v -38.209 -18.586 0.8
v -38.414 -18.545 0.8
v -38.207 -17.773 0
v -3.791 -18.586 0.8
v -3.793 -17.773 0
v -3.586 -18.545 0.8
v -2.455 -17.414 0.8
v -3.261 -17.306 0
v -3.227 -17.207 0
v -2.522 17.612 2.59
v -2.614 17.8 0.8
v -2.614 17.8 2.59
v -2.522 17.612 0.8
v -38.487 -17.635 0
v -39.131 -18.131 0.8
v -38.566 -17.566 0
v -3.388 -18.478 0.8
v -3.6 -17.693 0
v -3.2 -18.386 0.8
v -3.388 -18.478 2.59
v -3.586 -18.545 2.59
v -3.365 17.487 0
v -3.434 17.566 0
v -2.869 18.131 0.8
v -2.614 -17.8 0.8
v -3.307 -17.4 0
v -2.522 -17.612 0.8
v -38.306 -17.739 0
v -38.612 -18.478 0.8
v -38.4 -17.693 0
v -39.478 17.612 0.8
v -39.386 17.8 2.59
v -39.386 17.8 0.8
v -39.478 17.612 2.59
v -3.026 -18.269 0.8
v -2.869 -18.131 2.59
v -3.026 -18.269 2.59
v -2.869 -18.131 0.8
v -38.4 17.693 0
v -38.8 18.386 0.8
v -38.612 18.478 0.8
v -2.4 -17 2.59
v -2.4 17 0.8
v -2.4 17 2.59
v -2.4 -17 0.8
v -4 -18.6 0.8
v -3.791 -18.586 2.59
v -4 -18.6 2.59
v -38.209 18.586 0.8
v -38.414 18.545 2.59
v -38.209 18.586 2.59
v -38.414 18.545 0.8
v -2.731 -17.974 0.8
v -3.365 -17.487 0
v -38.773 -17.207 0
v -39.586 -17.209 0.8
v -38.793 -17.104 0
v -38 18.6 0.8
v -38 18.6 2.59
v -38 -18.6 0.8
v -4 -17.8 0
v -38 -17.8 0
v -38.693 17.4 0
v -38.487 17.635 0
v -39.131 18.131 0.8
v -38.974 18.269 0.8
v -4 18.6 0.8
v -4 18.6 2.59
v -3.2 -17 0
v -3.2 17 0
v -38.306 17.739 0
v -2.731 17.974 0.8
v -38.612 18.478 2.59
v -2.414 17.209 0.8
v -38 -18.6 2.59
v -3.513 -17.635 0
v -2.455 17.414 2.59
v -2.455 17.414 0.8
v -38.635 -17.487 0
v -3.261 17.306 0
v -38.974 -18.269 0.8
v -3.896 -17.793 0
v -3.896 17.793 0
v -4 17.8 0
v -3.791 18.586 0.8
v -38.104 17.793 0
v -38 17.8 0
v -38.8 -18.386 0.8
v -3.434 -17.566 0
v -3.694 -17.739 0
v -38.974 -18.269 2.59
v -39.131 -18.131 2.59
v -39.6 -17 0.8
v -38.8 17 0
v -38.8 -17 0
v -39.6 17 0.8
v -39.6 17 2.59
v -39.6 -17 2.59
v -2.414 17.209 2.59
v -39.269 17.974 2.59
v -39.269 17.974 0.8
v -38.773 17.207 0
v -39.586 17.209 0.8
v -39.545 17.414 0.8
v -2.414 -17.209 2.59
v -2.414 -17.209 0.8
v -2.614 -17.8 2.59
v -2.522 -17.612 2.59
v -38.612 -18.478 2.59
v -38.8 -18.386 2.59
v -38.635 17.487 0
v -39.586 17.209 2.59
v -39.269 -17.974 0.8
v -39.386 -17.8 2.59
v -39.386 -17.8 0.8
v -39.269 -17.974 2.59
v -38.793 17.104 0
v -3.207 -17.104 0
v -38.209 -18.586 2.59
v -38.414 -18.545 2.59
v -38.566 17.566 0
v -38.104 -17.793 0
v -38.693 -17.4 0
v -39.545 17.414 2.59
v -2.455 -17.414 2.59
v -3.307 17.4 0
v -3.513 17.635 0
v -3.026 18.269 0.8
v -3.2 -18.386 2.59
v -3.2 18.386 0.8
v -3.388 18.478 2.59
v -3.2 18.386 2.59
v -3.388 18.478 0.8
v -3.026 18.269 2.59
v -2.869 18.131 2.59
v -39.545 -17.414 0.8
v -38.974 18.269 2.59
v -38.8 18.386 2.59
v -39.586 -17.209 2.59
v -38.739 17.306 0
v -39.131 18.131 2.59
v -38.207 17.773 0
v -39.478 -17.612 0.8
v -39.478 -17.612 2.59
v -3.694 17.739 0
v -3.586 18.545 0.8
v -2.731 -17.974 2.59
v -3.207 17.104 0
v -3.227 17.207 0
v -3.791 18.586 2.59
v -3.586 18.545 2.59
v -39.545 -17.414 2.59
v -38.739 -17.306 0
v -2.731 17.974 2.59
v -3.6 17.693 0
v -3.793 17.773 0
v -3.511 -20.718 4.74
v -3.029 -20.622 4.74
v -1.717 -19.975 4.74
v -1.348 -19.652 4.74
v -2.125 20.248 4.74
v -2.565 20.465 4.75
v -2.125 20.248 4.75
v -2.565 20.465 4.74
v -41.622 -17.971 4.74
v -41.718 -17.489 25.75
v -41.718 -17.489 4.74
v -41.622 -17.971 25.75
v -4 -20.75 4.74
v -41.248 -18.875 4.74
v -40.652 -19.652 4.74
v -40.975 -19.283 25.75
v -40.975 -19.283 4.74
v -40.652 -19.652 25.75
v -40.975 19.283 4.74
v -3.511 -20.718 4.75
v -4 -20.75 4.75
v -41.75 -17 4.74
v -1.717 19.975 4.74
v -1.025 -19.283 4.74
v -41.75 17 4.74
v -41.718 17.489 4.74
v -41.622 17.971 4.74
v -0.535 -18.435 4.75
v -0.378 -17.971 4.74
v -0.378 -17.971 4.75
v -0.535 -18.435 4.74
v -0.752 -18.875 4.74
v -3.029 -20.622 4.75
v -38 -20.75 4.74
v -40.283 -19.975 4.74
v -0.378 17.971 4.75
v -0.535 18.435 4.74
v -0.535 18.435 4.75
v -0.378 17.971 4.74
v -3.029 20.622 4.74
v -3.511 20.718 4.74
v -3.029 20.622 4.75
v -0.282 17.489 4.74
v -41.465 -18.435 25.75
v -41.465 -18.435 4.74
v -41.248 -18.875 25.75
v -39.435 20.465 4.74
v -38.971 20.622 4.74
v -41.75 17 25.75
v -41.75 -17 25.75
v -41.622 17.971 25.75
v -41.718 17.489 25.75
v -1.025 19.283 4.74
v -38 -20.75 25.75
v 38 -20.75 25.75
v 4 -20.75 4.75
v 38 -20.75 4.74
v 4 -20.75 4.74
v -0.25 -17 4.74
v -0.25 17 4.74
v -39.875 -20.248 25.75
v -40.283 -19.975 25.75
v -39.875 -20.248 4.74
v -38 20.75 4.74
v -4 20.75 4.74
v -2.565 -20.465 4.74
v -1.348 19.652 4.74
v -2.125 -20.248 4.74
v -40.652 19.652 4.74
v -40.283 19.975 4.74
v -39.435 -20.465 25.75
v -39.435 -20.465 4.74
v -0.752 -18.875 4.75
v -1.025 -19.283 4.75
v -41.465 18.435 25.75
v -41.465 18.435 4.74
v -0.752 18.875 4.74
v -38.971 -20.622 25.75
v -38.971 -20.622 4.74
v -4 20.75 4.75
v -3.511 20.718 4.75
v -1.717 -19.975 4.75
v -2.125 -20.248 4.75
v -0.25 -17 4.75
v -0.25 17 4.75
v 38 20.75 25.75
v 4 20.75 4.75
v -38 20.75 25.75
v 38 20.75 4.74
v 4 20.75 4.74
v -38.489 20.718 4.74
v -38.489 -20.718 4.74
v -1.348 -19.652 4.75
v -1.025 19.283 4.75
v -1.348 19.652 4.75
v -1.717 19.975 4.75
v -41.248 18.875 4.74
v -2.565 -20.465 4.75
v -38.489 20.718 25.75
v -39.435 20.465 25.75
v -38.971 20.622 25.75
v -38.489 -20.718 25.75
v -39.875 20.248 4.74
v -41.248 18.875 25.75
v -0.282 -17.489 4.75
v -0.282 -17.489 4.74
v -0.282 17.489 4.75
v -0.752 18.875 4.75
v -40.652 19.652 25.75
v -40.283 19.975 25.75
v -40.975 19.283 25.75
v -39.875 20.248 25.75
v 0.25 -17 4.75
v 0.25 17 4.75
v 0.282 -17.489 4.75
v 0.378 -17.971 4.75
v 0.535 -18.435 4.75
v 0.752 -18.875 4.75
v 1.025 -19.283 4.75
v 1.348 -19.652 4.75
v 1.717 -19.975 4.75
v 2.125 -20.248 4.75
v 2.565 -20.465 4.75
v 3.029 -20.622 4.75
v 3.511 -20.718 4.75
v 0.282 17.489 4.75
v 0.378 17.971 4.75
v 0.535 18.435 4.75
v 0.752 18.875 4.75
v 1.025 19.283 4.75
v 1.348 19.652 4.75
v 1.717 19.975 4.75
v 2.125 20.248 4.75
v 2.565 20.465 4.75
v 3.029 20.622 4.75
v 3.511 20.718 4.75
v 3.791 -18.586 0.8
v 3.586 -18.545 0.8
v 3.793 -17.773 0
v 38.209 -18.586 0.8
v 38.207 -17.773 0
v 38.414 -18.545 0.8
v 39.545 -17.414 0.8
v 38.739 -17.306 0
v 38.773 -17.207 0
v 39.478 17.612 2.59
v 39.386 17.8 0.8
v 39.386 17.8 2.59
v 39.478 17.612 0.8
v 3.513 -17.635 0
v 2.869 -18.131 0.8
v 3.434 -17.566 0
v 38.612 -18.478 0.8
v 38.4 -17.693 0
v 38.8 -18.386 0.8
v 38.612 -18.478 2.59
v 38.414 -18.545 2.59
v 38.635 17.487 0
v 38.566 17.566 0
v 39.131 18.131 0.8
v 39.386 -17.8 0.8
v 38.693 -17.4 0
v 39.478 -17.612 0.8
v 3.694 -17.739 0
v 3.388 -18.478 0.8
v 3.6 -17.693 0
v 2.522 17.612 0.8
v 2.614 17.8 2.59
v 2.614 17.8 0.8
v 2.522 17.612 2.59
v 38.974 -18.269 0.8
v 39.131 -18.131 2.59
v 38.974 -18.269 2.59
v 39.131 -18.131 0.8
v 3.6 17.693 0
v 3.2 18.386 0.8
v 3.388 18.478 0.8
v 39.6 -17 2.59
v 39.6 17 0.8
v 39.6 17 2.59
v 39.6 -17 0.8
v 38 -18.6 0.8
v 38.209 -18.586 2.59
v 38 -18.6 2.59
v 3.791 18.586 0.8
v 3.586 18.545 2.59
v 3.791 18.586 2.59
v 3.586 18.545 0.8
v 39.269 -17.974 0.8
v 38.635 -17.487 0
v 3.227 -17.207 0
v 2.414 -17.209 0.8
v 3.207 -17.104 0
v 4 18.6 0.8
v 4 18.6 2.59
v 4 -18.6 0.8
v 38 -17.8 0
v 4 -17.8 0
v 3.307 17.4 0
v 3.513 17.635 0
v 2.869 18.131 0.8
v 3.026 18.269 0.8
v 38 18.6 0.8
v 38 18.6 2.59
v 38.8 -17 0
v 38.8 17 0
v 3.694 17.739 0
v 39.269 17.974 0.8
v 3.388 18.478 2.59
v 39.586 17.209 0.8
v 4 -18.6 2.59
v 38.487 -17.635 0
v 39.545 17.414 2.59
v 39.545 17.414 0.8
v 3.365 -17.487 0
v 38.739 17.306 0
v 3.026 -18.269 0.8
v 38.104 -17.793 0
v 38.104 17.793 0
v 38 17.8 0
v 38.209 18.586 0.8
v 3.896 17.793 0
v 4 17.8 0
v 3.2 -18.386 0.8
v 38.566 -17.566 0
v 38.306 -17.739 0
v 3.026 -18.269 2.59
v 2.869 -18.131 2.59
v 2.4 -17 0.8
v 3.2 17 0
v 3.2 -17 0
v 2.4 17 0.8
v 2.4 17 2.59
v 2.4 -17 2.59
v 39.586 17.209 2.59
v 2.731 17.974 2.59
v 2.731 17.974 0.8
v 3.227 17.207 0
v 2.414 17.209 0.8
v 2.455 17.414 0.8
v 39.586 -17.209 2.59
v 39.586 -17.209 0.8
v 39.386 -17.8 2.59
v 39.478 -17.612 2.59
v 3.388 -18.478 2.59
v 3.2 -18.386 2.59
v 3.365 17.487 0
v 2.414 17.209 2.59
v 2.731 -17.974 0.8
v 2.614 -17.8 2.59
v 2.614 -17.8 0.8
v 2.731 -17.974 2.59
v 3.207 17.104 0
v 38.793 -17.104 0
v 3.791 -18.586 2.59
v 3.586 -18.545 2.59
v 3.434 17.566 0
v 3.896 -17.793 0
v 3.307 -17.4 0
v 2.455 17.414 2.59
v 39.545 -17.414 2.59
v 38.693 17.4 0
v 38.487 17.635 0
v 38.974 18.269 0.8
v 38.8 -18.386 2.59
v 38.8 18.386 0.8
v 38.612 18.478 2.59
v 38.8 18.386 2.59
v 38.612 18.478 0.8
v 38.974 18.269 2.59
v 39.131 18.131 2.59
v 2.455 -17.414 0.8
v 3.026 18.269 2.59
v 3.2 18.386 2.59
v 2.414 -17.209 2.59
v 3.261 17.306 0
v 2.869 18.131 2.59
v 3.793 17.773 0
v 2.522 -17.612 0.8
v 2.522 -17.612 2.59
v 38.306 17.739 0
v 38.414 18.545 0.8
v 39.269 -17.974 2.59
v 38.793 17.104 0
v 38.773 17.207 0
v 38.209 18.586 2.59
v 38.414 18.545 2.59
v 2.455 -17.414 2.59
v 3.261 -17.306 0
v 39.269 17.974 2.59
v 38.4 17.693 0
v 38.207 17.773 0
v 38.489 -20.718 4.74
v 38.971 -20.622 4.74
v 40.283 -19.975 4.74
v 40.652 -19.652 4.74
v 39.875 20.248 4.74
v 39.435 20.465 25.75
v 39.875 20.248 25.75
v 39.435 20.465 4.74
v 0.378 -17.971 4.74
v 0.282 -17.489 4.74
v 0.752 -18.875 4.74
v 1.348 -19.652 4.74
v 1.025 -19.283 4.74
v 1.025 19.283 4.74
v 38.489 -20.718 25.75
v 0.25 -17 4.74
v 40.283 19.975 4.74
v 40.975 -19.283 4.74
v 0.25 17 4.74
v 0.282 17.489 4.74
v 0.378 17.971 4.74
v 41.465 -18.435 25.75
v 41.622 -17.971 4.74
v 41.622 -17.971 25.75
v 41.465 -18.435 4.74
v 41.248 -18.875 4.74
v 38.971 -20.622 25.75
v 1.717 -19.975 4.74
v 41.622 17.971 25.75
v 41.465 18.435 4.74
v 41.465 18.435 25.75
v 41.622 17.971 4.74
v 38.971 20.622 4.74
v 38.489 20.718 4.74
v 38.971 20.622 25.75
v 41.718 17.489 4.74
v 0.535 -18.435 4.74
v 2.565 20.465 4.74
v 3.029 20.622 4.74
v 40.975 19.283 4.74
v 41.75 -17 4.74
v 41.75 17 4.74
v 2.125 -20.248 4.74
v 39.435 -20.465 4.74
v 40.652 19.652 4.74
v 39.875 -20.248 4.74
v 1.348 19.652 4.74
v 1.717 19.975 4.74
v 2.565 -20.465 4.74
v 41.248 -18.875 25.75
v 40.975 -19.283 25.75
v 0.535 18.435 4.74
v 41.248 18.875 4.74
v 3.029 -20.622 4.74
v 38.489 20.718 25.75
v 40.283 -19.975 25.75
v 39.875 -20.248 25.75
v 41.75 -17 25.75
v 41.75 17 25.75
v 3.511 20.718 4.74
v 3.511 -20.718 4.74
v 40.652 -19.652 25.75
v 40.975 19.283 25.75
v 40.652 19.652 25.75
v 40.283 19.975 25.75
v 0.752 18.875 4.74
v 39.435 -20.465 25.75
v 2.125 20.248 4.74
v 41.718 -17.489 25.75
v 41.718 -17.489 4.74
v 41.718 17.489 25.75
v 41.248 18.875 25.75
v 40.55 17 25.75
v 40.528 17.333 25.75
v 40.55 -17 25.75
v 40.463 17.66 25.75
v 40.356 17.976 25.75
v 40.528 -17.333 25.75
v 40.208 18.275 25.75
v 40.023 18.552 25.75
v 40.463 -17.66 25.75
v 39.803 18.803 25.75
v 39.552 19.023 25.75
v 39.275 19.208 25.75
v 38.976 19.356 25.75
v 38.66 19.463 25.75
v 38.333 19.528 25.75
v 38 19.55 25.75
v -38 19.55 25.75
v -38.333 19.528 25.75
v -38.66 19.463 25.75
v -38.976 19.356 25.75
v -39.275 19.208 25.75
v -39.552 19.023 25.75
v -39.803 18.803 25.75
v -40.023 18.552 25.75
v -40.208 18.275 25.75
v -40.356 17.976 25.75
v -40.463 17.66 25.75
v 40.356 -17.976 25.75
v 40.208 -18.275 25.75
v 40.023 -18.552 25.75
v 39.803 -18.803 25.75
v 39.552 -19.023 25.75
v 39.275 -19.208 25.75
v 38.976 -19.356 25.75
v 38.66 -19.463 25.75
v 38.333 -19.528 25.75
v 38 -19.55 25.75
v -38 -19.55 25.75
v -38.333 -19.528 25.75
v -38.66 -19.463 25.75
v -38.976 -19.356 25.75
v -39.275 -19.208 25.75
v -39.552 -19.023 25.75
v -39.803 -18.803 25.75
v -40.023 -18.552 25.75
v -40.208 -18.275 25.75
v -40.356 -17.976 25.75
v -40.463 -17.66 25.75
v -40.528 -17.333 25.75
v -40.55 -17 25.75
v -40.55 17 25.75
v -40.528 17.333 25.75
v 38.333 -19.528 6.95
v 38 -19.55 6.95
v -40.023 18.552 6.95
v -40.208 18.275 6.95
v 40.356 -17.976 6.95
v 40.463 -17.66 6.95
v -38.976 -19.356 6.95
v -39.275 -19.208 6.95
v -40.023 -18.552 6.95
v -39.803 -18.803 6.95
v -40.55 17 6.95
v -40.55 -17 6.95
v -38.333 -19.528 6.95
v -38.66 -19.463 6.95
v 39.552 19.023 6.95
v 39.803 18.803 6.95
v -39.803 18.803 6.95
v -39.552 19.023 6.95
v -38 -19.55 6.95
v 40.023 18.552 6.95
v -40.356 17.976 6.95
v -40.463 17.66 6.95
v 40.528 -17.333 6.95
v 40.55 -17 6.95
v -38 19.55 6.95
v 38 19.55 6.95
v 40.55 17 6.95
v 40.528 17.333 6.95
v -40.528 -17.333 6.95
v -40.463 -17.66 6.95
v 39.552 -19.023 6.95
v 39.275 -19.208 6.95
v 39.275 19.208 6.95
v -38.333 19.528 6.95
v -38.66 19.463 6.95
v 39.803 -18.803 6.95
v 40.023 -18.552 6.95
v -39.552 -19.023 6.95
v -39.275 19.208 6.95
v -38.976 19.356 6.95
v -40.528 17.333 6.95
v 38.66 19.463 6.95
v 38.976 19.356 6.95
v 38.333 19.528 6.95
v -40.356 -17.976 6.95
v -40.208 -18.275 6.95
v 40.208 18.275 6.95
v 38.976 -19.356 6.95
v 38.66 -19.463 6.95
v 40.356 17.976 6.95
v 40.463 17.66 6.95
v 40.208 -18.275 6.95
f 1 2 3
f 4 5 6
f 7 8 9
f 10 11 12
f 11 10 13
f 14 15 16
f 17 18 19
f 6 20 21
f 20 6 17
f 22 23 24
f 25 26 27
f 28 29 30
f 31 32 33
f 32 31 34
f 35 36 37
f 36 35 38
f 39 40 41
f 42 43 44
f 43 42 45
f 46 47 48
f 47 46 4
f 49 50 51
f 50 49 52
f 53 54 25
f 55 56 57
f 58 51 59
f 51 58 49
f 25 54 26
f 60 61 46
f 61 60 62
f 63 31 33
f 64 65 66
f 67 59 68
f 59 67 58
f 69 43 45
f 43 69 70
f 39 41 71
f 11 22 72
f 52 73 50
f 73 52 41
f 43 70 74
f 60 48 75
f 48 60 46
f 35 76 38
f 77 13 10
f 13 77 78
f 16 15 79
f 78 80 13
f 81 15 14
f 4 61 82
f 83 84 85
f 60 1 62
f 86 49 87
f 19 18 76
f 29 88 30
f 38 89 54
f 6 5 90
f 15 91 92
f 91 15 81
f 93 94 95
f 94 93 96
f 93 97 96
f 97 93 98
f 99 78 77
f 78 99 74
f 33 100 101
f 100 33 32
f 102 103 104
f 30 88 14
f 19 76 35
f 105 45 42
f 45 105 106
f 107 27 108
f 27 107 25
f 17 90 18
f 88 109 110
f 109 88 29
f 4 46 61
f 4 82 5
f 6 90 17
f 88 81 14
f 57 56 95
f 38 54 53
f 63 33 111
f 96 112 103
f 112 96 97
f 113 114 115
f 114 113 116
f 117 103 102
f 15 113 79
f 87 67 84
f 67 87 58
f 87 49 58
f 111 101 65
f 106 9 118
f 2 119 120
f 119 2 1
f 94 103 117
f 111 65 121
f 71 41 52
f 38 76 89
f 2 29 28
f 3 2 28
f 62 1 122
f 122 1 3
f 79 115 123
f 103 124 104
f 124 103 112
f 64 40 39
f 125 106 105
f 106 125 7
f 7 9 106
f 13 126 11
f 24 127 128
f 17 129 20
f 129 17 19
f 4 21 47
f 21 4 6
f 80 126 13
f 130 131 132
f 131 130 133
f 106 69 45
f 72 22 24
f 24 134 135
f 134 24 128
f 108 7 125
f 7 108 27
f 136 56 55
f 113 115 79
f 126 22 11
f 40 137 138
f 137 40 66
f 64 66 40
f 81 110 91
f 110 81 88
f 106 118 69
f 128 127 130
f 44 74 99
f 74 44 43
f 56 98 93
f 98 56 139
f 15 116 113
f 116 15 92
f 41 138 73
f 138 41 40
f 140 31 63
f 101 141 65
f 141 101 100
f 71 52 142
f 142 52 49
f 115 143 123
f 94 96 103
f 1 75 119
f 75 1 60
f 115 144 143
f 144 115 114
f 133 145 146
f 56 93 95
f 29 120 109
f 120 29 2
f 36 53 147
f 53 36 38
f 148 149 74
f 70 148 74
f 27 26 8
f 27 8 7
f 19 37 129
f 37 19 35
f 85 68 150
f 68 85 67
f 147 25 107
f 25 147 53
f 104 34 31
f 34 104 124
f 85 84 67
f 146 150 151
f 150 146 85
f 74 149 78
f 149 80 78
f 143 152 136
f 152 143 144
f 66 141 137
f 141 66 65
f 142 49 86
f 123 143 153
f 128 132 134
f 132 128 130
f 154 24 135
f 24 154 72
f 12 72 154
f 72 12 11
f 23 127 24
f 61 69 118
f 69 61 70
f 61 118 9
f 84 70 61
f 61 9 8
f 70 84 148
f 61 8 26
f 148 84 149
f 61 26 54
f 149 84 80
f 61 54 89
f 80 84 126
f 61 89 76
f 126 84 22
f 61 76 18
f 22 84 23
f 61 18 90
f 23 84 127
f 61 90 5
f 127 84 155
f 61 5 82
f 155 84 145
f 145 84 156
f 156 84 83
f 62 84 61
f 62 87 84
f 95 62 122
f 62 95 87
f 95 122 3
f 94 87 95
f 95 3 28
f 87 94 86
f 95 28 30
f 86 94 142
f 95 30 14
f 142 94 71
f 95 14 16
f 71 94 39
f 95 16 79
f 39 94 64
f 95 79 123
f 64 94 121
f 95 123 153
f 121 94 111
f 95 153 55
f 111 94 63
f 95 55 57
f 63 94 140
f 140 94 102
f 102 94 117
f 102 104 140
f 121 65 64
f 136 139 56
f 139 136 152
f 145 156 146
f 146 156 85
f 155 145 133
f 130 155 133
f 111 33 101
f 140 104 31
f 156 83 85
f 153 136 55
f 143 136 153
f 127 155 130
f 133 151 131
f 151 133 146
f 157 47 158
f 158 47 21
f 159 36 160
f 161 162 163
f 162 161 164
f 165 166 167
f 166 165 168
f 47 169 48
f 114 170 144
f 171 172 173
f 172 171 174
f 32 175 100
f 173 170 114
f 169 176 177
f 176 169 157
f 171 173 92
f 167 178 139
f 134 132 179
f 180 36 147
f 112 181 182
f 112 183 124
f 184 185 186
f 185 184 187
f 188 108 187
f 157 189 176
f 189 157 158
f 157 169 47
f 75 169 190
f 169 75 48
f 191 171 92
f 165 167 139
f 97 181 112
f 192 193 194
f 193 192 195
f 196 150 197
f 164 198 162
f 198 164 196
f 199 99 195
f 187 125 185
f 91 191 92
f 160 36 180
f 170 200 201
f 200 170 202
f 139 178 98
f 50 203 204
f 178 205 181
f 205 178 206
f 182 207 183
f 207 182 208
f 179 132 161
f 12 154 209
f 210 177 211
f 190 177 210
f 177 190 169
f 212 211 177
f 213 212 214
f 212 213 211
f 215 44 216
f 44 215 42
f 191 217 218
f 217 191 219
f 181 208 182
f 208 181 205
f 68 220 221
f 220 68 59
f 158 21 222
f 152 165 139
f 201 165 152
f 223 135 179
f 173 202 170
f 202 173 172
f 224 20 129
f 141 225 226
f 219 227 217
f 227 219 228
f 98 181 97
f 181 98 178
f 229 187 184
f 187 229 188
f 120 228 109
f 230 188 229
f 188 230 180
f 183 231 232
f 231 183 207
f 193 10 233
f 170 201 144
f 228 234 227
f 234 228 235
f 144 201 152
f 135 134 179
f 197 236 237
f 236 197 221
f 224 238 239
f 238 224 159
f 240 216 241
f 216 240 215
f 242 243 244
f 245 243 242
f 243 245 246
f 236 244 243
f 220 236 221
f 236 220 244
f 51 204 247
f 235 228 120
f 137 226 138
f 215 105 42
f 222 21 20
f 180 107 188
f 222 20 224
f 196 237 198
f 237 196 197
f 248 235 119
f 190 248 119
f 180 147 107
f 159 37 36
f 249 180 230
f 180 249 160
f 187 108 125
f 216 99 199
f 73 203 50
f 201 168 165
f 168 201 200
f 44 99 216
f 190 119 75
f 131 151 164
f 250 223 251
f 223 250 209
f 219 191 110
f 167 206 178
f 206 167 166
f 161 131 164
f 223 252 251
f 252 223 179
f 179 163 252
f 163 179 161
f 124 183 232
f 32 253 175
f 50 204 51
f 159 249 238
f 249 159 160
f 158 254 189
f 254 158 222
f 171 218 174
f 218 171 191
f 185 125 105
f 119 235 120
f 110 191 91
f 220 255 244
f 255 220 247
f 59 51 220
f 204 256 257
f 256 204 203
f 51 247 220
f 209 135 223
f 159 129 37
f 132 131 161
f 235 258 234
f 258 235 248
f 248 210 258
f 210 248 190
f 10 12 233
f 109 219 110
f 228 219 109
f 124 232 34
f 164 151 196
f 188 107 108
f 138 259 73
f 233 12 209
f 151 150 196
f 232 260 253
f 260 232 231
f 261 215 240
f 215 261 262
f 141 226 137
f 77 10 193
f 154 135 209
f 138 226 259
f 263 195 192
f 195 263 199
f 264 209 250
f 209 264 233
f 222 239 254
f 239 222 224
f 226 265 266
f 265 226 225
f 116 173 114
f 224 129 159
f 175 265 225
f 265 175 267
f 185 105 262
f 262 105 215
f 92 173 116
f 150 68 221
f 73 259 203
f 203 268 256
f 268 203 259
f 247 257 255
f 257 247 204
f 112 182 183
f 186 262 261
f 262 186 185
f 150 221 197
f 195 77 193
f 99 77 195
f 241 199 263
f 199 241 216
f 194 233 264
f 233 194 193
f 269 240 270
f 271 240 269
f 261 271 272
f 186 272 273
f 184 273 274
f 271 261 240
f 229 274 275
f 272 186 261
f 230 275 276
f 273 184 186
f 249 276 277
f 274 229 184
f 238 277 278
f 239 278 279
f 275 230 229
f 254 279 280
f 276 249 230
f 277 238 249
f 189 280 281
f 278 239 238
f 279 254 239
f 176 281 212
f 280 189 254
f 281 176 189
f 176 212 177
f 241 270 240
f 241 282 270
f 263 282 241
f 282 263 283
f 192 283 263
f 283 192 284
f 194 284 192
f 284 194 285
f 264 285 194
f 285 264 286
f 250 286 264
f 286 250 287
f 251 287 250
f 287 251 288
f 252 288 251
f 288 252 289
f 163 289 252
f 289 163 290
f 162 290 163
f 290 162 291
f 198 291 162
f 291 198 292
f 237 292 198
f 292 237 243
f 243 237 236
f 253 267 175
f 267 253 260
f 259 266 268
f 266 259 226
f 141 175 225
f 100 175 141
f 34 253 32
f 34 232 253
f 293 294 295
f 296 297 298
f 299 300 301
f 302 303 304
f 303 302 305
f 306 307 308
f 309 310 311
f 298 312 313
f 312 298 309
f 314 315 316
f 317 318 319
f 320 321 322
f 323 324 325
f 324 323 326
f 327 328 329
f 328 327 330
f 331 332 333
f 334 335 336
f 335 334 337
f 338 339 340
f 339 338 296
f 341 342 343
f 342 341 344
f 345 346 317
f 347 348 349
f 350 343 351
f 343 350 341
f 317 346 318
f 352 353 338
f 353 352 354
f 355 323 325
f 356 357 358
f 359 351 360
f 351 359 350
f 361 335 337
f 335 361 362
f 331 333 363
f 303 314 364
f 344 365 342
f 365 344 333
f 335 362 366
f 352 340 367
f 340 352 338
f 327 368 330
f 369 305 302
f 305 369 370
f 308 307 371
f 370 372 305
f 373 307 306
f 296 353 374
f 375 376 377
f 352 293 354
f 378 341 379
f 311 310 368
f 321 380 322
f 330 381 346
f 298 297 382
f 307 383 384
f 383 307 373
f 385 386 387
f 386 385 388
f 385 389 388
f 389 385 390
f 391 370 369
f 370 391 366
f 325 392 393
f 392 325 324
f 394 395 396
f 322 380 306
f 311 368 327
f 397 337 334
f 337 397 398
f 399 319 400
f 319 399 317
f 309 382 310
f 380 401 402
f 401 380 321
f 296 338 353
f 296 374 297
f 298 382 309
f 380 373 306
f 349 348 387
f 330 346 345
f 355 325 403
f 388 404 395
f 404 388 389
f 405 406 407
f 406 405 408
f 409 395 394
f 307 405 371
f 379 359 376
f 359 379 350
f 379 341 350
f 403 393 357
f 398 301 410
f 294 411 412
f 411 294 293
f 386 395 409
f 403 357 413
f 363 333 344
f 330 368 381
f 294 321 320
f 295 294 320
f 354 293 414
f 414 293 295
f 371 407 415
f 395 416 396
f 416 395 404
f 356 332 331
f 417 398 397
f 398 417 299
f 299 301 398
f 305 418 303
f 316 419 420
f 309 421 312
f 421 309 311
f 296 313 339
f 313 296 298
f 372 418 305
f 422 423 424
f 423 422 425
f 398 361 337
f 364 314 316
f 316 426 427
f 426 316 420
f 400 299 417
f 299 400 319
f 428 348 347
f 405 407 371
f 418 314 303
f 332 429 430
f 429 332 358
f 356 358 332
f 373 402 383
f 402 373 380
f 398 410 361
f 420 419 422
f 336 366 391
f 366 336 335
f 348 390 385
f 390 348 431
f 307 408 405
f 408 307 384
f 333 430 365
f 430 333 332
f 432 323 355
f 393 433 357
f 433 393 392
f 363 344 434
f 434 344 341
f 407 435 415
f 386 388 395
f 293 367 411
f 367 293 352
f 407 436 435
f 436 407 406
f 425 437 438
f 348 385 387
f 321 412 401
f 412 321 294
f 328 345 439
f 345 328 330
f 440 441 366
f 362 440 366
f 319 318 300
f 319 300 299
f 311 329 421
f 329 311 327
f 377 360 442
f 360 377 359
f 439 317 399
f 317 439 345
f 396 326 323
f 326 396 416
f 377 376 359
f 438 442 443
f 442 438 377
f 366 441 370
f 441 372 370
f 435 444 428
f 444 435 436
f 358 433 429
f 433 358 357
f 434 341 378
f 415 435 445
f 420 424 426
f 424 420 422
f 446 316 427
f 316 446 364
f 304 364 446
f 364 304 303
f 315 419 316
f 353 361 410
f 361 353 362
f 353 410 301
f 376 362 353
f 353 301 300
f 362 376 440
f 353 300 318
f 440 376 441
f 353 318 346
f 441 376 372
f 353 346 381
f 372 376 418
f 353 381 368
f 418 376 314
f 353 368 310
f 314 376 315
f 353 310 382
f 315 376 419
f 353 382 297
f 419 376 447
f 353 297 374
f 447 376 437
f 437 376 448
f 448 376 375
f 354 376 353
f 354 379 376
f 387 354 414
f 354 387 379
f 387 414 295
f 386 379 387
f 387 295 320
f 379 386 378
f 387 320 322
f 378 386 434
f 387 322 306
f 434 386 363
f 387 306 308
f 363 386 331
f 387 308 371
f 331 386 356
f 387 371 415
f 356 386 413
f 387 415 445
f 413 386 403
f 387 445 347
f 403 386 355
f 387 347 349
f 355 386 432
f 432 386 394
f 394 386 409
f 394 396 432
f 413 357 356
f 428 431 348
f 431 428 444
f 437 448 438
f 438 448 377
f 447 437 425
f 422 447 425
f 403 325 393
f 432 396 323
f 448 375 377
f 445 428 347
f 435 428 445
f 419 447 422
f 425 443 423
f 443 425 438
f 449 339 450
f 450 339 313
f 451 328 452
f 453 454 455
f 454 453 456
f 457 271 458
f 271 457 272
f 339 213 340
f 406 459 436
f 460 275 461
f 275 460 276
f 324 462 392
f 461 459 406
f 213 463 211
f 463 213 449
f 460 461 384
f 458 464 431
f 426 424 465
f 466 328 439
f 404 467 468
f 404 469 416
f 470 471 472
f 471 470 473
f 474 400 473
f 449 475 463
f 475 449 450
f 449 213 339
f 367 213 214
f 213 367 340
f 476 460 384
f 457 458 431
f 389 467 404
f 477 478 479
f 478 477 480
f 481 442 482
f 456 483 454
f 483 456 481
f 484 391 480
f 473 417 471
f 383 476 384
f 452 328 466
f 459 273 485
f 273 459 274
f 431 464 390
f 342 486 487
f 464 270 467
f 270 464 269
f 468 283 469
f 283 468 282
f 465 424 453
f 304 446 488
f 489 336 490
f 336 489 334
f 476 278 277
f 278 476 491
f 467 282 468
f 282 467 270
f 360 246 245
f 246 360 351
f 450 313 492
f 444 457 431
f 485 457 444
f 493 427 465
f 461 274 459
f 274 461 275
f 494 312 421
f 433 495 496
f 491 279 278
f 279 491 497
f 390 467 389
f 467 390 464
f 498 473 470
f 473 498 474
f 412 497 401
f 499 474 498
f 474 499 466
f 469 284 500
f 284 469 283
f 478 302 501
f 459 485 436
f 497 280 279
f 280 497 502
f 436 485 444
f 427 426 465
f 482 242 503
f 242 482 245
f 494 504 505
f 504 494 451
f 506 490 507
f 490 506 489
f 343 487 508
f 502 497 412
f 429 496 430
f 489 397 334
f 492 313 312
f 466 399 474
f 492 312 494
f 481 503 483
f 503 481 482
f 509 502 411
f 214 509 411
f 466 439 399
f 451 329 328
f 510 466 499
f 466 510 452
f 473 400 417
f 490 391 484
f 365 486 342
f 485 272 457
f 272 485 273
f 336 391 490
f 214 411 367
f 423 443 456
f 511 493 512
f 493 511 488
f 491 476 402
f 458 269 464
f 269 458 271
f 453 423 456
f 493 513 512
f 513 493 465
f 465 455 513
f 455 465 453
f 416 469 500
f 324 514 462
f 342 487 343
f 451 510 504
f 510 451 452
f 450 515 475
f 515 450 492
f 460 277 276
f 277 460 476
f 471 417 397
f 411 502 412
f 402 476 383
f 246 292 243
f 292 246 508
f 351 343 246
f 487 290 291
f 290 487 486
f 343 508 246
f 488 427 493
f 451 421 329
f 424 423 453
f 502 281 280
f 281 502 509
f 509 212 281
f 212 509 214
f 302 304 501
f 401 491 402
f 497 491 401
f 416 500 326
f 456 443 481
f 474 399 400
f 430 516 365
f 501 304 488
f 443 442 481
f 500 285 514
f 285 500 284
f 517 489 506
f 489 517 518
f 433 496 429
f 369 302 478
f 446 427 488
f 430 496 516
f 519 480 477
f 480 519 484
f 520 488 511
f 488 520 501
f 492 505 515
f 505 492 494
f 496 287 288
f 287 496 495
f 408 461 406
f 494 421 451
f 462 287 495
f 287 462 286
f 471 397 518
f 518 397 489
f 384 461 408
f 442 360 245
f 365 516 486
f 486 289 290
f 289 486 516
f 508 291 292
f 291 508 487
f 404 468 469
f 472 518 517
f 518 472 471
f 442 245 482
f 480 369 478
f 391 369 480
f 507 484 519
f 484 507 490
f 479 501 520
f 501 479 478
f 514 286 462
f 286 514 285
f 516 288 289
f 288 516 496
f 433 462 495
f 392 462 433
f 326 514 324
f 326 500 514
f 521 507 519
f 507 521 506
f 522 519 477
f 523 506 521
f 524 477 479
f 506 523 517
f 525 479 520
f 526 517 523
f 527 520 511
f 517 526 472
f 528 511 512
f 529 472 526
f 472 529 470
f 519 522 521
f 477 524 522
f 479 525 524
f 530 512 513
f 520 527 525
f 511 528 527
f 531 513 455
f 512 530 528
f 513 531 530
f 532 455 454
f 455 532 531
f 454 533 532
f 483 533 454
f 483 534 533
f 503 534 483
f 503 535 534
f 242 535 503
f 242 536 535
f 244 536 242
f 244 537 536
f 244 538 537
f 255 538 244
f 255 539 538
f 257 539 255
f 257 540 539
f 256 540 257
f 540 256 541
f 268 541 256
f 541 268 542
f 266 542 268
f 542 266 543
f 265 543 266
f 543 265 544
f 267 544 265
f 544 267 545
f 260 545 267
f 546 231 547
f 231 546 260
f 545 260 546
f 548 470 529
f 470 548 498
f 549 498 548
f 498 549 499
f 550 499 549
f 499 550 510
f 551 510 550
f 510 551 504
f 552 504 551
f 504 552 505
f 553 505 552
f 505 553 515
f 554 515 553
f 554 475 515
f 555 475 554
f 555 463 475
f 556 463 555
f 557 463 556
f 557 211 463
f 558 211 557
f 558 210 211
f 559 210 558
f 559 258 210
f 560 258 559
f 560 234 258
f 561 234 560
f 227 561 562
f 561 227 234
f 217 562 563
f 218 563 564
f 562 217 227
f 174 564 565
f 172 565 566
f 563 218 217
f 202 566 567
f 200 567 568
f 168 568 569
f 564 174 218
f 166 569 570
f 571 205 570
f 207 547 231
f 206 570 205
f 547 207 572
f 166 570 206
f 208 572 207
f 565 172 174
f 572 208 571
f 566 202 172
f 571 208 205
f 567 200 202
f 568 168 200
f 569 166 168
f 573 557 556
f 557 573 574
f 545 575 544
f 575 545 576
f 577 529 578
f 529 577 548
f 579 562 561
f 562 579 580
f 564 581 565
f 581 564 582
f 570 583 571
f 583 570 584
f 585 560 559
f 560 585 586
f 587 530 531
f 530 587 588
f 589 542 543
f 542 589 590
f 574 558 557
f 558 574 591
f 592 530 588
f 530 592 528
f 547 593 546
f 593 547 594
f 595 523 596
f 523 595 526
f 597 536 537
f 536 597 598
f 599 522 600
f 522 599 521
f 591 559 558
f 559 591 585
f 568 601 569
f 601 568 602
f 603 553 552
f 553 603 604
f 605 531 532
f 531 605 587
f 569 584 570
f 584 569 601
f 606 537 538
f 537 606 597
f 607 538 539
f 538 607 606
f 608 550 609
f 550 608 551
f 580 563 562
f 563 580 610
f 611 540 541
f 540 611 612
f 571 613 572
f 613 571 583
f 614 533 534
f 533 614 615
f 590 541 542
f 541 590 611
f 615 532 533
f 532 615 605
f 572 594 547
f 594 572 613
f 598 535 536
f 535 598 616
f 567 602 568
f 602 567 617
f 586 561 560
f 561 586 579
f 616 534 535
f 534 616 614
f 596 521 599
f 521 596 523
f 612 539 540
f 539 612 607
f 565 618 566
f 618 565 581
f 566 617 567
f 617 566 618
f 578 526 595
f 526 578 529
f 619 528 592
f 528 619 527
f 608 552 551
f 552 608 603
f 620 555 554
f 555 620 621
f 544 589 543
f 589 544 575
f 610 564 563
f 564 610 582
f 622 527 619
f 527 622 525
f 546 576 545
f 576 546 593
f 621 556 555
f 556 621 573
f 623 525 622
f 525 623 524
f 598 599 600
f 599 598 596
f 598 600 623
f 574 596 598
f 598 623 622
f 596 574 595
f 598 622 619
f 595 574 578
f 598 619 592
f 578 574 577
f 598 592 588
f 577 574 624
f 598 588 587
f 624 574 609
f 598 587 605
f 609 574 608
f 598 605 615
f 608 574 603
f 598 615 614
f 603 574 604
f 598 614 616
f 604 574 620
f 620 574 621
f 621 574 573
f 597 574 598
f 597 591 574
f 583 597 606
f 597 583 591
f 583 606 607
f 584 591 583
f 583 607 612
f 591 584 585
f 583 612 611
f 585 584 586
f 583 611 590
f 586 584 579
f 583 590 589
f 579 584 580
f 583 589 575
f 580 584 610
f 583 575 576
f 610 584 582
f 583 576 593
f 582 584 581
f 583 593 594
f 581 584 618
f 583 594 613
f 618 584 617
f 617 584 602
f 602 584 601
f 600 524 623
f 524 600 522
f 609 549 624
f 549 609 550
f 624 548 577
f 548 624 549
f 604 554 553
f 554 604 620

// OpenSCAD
// gridfinity_bin/model.scad — Gridfinity-compatible open storage bin.
// Base pads follow the standard unit profile (bottom-up): 0.8 mm 45°
// chamfer → 1.8 mm straight → 2.15 mm 45° chamfer, 41.5 mm top footprint
// on a 42 mm pitch. Body height = units_h × 7 mm above the 4.75 mm base.

grid_x = 2;
grid_y = 1;
units_h = 3;
wall = 1.2;
floor_th = 2.2;
magnets = 0;

pitch = 42;
pad_top = 41.5;      // pad footprint at the top of the base profile
r_top = 3.75;
h_c1 = 0.8;          // bottom chamfer height (45°)
h_str = 1.8;         // straight section height
h_c2 = 2.15;         // top chamfer height (45°)
base_h = h_c1 + h_str + h_c2;   // 4.75

pad_mid = pad_top - 2 * h_c2;   // 37.2
pad_bot = pad_mid - 2 * h_c1;   // 35.6
r_mid = max(0.5, r_top - h_c2);
r_bot = max(0.3, r_mid - h_c1);

body_w = grid_x * pitch - 0.5;  // 0.25 mm clearance per side
body_d = grid_y * pitch - 0.5;
body_h = units_h * 7;

magnet_d = 6.5;
magnet_h = 2.4;
magnet_off = 13;     // magnet centers ±13 mm from pad center (26 mm spacing)

$fn = 48;

module rounded_rect(w, h, r) {
  rr = min(r, w/3, h/3);
  offset(r = rr) square([w - 2*rr, h - 2*rr], center = true);
}

module slab(w, r, z, h) {
  translate([0, 0, z]) linear_extrude(height = h) rounded_rect(w, w, r);
}

// One base pad: two hulled chamfers around a straight section
module base_pad() {
  hull() {
    slab(pad_bot, r_bot, 0, 0.01);
    slab(pad_mid, r_mid, h_c1, 0.01);
  }
  slab(pad_mid, r_mid, h_c1, h_str);
  hull() {
    slab(pad_mid, r_mid, h_c1 + h_str - 0.01, 0.01);
    slab(pad_top, r_top, base_h - 0.01, 0.01);
  }
}

module pads() {
  for (gx = [0 : grid_x - 1])
    for (gy = [0 : grid_y - 1])
      translate([(gx - (grid_x - 1) / 2) * pitch,
                 (gy - (grid_y - 1) / 2) * pitch, 0])
        base_pad();
}

module magnet_pockets() {
  for (gx = [0 : grid_x - 1])
    for (gy = [0 : grid_y - 1])
      for (mx = [-1, 1])
        for (my = [-1, 1])
          translate([(gx - (grid_x - 1) / 2) * pitch + mx * magnet_off,
                     (gy - (grid_y - 1) / 2) * pitch + my * magnet_off, -0.01])
            cylinder(d = magnet_d, h = magnet_h);
}

difference() {
  union() {
    pads();
    // body shell sits on the pads
    translate([-body_w/2, -body_d/2, base_h])
      linear_extrude(height = body_h)
        translate([body_w/2, body_d/2])
          rounded_rect(body_w, body_d, r_top);
  }
  // interior cavity
  translate([0, 0, base_h + floor_th])
    linear_extrude(height = body_h + 1)
      rounded_rect(body_w - 2*wall, body_d - 2*wall, max(0.5, r_top - wall));
  if (magnets == 1)
    magnet_pockets();
}
